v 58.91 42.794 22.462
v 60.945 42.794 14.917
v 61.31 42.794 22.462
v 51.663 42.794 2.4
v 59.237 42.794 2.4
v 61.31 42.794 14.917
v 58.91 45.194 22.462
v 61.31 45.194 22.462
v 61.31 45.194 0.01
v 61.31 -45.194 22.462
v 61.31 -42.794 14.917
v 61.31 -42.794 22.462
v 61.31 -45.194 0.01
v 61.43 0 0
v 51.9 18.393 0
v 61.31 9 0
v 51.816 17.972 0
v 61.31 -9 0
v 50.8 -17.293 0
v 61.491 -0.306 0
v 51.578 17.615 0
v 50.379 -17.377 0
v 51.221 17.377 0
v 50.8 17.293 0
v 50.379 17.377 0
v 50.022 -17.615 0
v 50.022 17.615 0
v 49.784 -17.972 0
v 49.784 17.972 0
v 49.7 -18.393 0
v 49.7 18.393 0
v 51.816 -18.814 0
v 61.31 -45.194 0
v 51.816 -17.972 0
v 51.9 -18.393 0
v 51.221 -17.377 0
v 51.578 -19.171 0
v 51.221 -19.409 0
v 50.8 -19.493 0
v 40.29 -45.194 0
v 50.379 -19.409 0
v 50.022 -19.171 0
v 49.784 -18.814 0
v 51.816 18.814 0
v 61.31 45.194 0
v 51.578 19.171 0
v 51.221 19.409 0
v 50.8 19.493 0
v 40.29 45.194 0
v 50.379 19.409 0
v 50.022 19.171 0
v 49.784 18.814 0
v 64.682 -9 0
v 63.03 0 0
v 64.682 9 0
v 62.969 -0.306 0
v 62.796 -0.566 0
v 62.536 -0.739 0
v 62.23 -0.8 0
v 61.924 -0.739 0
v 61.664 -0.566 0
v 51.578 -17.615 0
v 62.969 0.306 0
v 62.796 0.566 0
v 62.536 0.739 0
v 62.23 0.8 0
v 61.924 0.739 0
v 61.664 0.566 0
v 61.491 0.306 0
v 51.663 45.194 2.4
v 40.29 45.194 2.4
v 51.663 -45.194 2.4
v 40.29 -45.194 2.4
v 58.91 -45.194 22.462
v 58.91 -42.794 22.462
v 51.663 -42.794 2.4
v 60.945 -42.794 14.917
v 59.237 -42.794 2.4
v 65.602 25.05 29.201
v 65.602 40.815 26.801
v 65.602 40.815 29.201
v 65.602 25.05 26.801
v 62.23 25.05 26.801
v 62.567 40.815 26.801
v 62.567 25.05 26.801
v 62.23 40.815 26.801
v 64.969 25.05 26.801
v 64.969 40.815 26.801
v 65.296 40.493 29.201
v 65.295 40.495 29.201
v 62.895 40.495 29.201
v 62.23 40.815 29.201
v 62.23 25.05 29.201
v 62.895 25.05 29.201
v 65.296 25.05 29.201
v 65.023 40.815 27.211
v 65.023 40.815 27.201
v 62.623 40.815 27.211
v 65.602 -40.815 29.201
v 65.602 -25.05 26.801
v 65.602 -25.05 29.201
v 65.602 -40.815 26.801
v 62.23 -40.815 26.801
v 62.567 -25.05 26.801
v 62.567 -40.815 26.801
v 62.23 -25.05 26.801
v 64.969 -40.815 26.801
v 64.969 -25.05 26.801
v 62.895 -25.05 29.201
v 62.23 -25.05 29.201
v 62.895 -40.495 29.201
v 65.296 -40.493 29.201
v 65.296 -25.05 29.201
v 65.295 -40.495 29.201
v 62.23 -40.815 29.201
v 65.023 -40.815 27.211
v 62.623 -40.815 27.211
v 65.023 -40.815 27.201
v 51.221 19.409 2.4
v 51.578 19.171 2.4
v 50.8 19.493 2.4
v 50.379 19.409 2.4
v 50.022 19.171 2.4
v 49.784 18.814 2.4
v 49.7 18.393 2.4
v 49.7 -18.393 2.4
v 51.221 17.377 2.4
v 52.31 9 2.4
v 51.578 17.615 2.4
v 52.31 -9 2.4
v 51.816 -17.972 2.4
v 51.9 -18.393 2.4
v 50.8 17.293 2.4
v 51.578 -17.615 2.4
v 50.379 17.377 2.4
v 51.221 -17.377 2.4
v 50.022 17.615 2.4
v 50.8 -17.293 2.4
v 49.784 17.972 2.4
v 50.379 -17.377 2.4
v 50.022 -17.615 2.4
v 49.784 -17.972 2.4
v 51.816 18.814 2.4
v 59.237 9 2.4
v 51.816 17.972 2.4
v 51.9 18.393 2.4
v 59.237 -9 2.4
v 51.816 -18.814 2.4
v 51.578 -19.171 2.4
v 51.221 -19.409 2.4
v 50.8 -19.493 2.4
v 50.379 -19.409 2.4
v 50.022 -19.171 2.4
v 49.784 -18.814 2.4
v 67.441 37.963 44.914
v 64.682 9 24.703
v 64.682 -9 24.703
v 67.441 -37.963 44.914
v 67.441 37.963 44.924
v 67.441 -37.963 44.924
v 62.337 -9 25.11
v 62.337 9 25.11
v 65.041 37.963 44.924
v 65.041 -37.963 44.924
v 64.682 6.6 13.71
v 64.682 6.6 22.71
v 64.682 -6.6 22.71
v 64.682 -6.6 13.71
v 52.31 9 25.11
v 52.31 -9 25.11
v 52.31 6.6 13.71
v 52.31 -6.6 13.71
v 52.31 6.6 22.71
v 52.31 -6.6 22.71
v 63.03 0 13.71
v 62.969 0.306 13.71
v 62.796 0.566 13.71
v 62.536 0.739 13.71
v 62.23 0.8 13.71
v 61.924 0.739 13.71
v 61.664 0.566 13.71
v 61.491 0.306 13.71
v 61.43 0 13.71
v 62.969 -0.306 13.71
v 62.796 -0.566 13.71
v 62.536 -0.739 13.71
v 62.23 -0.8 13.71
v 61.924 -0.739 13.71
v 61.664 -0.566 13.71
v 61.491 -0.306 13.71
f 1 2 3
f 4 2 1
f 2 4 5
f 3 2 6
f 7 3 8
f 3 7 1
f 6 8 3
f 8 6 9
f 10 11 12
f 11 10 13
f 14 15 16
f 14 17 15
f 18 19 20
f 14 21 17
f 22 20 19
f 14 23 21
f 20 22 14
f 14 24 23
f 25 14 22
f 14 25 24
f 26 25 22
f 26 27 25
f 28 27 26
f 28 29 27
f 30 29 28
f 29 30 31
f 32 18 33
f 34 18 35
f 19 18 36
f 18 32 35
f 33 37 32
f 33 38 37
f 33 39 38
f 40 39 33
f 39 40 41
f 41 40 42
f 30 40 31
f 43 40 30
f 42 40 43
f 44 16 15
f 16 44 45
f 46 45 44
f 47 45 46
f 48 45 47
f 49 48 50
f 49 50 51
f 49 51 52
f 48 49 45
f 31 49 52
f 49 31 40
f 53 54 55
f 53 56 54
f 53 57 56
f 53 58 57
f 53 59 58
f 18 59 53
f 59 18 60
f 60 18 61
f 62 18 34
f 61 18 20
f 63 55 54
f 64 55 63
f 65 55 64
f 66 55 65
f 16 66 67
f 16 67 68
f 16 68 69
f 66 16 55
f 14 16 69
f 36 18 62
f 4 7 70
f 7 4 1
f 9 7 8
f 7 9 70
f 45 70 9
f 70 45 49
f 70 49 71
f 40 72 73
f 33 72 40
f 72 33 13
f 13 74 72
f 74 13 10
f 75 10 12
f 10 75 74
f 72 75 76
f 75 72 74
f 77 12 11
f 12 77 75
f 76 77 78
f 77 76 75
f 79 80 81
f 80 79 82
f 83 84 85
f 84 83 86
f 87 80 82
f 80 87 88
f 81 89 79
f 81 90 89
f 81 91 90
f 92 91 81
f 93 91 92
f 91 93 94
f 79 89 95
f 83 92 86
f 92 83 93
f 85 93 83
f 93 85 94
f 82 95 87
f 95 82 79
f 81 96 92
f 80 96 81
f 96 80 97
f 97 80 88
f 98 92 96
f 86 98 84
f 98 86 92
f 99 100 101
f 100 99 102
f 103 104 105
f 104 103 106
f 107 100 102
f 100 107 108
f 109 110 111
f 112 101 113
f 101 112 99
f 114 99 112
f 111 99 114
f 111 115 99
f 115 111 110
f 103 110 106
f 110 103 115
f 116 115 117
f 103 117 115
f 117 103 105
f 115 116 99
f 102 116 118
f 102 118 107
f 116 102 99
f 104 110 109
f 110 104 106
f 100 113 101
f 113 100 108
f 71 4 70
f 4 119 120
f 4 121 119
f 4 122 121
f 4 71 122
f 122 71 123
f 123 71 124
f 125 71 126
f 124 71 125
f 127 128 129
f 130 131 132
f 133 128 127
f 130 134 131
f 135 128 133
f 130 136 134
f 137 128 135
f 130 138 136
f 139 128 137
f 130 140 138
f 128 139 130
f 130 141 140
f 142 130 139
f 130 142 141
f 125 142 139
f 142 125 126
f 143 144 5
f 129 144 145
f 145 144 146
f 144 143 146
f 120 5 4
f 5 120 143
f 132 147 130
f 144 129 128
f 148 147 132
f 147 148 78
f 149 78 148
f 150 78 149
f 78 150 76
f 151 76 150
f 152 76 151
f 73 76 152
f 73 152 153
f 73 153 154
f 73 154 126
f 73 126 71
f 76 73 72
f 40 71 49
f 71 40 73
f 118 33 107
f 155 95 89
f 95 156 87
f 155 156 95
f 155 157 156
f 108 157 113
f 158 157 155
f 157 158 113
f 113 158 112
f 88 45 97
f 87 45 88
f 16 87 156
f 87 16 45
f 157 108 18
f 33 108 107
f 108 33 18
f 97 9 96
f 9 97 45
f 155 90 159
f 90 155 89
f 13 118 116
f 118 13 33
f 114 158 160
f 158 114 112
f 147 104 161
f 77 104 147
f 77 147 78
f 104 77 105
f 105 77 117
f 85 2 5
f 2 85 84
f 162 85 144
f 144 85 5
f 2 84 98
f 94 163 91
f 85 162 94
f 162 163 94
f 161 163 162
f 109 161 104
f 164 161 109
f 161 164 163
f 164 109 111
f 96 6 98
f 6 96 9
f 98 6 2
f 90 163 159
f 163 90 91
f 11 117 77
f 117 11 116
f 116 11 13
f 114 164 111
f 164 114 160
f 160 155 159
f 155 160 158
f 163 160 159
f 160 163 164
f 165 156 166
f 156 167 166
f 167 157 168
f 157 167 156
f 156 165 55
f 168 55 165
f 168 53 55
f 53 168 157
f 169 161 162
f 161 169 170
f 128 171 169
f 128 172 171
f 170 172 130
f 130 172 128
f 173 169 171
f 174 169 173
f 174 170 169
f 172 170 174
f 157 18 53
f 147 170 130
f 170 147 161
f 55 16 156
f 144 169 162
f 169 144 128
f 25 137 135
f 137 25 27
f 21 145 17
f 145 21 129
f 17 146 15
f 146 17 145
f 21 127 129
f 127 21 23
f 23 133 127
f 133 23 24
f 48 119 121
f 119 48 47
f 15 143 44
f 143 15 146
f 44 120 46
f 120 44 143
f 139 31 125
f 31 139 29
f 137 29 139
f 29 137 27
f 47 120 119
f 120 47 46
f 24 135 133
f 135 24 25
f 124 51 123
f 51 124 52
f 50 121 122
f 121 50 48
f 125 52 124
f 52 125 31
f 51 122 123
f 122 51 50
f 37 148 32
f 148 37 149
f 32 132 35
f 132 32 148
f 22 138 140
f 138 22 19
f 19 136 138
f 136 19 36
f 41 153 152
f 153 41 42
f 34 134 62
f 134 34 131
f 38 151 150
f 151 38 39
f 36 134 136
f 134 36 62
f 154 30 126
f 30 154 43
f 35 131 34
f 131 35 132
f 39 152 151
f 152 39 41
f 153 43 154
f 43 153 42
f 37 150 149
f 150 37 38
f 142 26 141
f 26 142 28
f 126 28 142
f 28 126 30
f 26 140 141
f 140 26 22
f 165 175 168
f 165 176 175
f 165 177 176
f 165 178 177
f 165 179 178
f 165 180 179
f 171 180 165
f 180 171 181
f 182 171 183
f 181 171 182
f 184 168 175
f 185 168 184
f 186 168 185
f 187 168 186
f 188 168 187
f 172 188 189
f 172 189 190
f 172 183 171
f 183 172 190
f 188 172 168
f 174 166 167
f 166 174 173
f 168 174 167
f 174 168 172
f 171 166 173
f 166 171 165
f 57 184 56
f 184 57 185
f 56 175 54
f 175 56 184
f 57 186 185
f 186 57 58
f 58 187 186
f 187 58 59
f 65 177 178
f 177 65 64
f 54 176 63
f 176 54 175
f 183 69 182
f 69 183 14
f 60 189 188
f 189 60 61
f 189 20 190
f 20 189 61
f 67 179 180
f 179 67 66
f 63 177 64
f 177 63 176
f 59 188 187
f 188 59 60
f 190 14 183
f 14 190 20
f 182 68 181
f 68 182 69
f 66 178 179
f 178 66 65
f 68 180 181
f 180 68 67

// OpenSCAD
// Milwaukee Road Little Joe, G scale 1-29 - print 15 of 20: pilot - pilot with coupler pocket - print 2
// Render (F6), export STL, print. Settings: ../../library/lj_params.scad
// Whole loco preview and notes: ../../MILW_LittleJoe_Main.scad
SCALE_SEL = "G";
LOCO_SEL = "E70";   // [E20, E21, E70, E71, E72, E73, E74, E75, E76, E77, E78, E79] the body and roof change for E20 / E21
include <../../library/lj_all.scad>
lj_plate("pilot");
